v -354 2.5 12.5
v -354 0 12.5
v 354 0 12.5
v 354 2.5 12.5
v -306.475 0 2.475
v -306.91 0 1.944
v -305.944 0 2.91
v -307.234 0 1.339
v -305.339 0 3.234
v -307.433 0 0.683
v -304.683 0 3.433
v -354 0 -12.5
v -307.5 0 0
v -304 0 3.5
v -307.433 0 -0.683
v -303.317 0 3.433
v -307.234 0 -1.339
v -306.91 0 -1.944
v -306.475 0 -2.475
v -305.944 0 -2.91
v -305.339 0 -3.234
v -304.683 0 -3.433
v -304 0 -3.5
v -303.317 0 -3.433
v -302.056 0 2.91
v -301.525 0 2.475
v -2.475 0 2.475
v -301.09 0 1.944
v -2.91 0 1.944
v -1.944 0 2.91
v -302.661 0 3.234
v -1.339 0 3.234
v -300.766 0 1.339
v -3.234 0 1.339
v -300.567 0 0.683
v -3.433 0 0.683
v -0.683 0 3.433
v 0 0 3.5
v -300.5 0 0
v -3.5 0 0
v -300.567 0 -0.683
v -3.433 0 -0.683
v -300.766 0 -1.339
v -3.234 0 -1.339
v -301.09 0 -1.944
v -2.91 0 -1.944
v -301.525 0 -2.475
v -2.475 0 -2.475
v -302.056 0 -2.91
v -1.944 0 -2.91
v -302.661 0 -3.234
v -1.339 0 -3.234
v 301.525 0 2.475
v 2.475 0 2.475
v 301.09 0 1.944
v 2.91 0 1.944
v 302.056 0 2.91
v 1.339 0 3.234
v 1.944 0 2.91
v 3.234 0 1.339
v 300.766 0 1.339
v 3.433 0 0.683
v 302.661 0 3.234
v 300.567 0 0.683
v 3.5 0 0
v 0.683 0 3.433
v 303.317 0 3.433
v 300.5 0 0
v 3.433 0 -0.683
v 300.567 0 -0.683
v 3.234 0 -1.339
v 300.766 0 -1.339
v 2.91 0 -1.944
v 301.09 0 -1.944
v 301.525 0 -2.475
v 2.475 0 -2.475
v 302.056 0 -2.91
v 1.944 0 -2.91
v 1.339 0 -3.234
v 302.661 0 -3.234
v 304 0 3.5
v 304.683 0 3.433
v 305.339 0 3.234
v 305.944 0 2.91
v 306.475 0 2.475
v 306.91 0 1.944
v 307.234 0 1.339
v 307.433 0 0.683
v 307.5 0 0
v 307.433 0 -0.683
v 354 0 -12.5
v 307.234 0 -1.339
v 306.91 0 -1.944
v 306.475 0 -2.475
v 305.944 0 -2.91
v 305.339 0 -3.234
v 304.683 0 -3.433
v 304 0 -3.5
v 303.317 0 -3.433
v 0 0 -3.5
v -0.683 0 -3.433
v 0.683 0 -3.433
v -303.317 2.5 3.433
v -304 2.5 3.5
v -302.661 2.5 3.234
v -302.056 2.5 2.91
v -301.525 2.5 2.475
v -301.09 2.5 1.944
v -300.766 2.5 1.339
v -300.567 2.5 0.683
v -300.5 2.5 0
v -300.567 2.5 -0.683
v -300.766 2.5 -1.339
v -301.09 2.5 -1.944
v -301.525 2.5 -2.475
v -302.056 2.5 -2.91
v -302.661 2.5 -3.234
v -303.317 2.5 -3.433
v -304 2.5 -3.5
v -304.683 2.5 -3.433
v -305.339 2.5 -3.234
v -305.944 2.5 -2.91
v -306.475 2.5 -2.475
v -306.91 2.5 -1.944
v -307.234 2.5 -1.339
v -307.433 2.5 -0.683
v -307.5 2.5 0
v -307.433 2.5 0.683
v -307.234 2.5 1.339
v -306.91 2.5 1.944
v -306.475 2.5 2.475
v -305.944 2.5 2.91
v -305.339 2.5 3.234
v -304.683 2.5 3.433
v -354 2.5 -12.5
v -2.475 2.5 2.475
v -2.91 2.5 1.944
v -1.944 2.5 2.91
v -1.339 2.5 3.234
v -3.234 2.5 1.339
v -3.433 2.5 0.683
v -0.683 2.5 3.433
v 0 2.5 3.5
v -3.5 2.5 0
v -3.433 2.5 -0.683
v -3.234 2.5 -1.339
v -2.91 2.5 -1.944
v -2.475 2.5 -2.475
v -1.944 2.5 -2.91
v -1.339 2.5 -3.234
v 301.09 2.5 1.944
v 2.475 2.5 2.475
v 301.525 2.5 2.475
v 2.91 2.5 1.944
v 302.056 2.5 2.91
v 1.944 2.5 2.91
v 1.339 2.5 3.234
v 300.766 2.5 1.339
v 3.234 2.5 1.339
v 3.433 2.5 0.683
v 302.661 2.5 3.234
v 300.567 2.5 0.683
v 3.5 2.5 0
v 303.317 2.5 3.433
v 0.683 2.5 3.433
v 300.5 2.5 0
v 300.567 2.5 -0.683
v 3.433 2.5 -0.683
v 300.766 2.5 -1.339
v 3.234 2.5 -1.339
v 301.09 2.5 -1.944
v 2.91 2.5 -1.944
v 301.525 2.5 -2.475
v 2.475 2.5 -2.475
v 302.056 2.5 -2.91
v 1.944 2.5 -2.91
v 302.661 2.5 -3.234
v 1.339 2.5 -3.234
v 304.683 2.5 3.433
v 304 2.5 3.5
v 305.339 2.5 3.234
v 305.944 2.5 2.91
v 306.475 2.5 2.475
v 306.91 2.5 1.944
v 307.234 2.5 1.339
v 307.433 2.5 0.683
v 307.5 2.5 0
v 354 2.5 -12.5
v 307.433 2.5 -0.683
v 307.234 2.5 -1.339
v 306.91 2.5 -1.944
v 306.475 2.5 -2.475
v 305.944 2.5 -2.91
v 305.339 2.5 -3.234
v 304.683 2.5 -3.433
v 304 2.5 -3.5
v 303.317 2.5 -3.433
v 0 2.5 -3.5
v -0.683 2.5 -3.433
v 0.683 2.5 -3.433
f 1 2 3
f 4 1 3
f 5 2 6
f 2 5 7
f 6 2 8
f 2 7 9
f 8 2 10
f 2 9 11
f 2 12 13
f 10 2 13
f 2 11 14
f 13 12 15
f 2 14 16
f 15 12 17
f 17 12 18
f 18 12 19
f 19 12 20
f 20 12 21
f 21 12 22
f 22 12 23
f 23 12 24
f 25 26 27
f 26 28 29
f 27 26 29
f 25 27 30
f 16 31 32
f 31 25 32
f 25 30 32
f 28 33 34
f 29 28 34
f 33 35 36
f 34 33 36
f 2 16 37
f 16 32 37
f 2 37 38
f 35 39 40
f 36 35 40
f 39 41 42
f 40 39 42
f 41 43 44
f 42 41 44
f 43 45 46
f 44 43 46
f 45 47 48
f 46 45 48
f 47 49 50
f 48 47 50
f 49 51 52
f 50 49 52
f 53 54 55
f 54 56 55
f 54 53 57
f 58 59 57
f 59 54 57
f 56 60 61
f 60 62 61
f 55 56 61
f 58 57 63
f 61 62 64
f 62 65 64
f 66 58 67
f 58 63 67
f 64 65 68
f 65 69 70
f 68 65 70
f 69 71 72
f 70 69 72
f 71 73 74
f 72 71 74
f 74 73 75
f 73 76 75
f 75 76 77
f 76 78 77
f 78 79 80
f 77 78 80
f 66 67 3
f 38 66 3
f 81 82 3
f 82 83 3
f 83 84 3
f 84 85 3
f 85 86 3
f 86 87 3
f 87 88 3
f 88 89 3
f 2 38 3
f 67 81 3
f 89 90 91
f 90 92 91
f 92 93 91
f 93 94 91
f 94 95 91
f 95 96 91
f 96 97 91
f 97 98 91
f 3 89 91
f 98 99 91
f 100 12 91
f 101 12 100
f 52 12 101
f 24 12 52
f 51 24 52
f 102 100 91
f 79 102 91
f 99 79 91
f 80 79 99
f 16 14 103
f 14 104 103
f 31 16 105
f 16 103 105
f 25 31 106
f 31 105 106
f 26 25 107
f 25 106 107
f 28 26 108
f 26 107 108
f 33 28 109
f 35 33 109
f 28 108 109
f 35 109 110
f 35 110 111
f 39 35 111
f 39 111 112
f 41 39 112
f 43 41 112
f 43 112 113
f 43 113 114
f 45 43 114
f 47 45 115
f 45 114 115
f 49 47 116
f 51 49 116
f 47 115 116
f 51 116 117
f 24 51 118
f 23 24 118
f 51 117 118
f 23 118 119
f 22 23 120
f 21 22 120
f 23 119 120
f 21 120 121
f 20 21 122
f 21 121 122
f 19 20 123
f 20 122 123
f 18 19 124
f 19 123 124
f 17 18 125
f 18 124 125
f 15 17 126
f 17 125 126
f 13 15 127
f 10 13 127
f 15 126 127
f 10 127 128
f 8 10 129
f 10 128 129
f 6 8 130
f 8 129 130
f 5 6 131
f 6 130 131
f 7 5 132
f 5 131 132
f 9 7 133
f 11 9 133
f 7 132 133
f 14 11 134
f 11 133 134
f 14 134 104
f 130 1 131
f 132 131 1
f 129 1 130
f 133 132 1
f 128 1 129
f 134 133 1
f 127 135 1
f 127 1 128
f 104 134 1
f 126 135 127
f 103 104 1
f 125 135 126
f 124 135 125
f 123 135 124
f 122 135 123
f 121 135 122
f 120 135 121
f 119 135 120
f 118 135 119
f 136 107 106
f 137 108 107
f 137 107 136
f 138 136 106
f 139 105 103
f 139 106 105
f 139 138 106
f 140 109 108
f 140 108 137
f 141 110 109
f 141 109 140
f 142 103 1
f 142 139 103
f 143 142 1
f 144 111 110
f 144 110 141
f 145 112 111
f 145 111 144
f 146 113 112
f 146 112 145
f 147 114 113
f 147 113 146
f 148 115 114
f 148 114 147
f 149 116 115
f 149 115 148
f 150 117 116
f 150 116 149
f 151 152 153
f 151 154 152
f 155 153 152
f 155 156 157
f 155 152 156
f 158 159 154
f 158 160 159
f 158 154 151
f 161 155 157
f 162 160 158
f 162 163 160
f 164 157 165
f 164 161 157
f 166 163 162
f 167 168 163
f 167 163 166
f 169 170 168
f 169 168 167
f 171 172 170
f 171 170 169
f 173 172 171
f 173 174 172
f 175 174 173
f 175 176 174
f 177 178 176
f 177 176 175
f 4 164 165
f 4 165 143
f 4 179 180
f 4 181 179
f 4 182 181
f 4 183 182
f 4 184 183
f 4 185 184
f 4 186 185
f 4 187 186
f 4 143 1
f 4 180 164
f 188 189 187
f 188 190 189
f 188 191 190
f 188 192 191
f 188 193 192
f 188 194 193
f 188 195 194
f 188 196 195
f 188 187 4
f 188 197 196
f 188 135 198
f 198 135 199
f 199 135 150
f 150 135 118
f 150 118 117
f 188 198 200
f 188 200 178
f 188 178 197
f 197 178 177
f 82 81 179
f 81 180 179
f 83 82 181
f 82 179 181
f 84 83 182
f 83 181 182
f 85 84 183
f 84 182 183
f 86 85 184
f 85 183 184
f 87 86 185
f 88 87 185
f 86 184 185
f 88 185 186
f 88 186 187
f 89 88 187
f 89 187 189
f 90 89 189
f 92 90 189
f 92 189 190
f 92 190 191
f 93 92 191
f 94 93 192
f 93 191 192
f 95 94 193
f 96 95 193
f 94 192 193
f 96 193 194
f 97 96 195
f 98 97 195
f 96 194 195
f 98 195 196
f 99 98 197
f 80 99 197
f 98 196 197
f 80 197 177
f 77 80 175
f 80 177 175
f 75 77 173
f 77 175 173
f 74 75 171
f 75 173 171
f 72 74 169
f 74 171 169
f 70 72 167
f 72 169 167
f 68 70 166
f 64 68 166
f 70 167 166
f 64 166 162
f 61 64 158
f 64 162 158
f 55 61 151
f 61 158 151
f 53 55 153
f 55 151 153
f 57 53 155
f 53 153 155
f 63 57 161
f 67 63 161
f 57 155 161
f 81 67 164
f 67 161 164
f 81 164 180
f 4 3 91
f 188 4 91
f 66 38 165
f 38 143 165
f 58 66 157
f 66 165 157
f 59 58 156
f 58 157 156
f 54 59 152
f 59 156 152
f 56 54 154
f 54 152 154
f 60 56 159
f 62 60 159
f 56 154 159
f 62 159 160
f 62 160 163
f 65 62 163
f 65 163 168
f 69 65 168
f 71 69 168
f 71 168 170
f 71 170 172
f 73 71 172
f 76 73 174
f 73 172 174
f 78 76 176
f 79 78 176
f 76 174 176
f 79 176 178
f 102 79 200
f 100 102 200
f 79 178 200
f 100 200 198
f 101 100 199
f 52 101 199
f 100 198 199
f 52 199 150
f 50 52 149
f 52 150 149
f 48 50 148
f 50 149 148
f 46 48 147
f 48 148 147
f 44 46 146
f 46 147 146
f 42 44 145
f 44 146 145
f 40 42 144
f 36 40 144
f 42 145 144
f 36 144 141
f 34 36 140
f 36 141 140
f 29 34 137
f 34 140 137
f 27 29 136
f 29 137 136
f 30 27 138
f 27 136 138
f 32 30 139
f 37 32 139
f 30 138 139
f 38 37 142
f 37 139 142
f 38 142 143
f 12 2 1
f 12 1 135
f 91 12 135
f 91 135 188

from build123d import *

# Parameters (mm, degrees)
SKETCH1_W           = 708
SKETCH1_H           = 25
BOSS_EXTRUDE1_DEPTH = 2.5
SKETCH2_R           = 3.5
CUT_EXTRUDE1_DEPTH  = 355.229445416
LPATTERN1_COUNT     = 3
LPATTERN1_PITCH     = 304


with BuildPart() as part:
    # Sketch1 → Boss-Extrude1 (new body)
    with BuildSketch(Plane(origin=(0, 0, 0), x_dir=(1, 0, 0), z_dir=(0, 1, 0))):
        Rectangle(SKETCH1_W, SKETCH1_H)
    extrude(amount=BOSS_EXTRUDE1_DEPTH)

    # Sketch2 → Cut-Extrude1 (cut, symmetric)
    with BuildSketch(Plane(origin=(0, 2.5, 0), x_dir=(1, 0, 0), z_dir=(0, 1, 0))):
        with Locations(Location((-304, 0, 0), (0, 0, 270))):
            Circle(SKETCH2_R)
    cut_extrude1 = extrude(amount=CUT_EXTRUDE1_DEPTH, both=True, mode=Mode.SUBTRACT)

    # LPattern1: Cut-Extrude1 ×3
    with Locations(*[(i * LPATTERN1_PITCH, 0, 0) for i in range(1, LPATTERN1_COUNT)]):
        add(cut_extrude1, mode=Mode.SUBTRACT)


solid = part.part
